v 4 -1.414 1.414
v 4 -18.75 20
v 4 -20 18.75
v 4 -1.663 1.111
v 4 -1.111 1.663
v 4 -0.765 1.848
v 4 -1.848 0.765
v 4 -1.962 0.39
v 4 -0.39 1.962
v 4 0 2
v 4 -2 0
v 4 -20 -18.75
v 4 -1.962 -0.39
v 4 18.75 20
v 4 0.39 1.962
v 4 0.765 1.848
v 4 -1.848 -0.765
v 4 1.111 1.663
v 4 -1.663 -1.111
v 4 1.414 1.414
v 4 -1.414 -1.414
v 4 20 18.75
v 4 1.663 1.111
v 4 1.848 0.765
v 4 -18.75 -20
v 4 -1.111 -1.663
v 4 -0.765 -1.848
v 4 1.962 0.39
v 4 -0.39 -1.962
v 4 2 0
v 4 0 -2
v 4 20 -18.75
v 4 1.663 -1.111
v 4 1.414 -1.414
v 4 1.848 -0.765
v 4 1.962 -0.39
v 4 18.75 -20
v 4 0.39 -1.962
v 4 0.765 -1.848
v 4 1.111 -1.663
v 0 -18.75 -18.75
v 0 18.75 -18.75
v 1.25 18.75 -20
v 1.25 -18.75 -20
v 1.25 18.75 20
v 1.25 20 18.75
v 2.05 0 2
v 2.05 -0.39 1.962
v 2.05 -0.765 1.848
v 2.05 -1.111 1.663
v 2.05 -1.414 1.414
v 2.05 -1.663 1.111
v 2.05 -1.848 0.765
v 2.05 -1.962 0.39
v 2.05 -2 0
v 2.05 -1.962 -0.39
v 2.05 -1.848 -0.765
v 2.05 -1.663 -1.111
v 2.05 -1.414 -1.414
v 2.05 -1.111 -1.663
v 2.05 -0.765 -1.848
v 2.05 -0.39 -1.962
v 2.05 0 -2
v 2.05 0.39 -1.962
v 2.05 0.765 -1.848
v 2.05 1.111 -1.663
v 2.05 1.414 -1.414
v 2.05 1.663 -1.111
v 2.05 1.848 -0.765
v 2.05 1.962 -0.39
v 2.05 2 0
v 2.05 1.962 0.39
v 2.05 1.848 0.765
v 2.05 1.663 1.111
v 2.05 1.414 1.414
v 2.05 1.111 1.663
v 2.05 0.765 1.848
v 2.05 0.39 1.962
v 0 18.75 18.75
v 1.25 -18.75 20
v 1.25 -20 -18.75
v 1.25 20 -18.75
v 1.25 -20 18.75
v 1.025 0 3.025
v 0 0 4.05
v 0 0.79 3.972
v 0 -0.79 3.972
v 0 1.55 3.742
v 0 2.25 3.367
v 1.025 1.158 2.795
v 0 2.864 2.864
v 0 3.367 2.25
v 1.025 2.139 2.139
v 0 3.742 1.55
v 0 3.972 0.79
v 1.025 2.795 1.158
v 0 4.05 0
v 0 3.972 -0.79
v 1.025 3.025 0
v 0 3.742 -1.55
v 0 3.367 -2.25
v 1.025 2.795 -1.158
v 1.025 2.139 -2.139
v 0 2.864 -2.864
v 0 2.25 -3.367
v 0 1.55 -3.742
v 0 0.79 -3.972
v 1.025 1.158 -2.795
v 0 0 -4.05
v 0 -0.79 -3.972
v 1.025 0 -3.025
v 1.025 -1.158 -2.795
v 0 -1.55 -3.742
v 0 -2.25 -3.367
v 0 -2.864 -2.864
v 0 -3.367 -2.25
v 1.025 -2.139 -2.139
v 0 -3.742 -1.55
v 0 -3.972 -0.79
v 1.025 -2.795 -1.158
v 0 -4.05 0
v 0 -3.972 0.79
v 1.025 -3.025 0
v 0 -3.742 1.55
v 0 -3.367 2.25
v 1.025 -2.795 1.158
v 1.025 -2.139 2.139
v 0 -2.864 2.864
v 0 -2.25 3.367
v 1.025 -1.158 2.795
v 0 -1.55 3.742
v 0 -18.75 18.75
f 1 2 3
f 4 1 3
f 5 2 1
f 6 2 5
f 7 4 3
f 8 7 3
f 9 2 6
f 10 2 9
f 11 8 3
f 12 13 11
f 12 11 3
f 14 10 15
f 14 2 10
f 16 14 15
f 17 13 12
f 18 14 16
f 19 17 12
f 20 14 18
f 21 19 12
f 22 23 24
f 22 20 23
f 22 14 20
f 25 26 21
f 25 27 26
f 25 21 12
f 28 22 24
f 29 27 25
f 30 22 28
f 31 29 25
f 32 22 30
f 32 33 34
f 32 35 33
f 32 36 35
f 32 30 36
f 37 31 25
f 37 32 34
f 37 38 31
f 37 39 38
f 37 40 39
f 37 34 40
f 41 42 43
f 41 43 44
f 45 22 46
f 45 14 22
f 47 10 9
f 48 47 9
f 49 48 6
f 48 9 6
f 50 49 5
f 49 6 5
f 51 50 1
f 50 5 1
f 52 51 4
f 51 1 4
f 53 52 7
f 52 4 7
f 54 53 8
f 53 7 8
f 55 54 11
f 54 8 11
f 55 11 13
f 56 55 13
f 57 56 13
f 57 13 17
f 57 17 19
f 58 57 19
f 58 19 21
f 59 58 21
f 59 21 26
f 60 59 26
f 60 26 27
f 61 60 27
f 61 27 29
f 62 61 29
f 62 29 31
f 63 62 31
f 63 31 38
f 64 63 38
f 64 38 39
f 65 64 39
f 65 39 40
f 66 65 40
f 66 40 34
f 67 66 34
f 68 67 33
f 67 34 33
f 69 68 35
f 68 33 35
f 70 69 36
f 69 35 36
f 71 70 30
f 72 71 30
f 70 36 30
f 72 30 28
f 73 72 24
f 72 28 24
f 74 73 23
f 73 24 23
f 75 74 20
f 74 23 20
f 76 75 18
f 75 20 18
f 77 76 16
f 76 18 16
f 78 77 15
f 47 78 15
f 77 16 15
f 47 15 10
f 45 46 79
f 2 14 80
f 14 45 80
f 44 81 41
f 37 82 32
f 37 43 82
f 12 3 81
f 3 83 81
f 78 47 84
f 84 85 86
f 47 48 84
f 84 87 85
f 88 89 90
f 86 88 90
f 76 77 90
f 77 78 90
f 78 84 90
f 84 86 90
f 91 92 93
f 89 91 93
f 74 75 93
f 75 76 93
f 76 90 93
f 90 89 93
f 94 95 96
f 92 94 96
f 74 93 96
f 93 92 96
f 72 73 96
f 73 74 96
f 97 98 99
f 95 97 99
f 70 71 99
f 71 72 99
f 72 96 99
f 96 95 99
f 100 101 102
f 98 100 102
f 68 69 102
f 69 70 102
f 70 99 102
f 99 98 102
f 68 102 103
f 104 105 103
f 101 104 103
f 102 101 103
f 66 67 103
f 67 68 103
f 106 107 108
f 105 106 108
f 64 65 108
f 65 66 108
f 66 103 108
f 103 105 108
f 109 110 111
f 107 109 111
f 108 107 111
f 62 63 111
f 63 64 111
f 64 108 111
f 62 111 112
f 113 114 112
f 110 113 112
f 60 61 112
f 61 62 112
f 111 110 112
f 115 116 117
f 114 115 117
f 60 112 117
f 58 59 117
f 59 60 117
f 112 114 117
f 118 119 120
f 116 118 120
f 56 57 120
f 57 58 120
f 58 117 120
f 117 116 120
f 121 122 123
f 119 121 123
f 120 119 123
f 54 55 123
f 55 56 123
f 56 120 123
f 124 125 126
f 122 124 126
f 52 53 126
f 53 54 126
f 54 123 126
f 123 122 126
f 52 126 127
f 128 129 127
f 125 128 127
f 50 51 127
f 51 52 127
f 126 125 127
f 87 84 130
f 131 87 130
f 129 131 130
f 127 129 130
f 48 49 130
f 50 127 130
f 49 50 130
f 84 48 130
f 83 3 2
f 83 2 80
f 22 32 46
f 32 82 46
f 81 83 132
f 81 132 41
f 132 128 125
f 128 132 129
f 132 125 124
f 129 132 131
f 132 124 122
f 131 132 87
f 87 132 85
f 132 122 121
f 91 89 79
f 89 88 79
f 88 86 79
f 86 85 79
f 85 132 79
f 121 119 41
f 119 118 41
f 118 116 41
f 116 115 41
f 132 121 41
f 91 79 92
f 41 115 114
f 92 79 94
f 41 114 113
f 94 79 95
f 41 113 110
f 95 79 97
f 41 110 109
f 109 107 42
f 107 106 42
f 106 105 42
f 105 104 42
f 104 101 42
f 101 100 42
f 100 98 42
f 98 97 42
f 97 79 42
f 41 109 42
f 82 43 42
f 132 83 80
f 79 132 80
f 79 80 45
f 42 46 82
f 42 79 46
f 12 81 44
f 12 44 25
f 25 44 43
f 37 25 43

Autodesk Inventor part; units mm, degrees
sketch "Skizze_1" plane through (0, 0, 0) normal (1, 0, 0) x (0, 0, -1)
  line L0 (-20, 20) -> (-20, -20)
  line L1 (-20, -20) -> (20, -20)
  line L2 (20, -20) -> (20, 20)
  line L3 (20, 20) -> (-20, 20)
extrude "Extrusion1" add sketch "Skizze_1" along normal blind 4
sketch "Sketch2" plane through (0, 0, 0) normal (-1, 0, 0) x (0, 0, 1)
  point P0 (0, 0)
hole "Hole1" at (0, 0, 0) direction (1, 0, 0) diameter 4 depth 4 countersink diameter 8.1 countersink angle 90
ref_plane "CS_ANBAU_CAP_XY" through (0, 0, 0) normal (0, 1, 0) x (1, 0, 0)
ref_plane "CS_ANBAU_CAP_YZ" through (0, 0, 0) normal (1, 0, 0) x (0, 0, -1)
ref_plane "CS_ANBAU_CAP_ZX" through (0, 0, 0) normal (0, 0, -1) x (0, 1, 0)
ref_plane "CS_ANBAU_CAP_90_XY" through (0, 0, 0) normal (0, 0, 1) x (1, 0, 0)
ref_plane "CS_ANBAU_CAP_90_YZ" through (0, 0, 0) normal (1, 0, 0) x (0, 1, 0)
ref_plane "CS_ANBAU_CAP_90_ZX" through (0, 0, 0) normal (0, 1, 0) x (0, 0, 1)
ref_plane "IB_1_XY" through (0, 0, 0) normal (1, 0, 0) x (0, 0, -1)
ref_plane "IB_1_YZ" through (0, 0, 0) normal (0, 0, -1) x (0, 1, 0)
ref_plane "IB_1_ZX" through (0, 0, 0) normal (0, 1, 0) x (1, 0, 0)
ref_plane "IB_10_XY" through (0, -14, 10) normal (1, 0, 0) x (0, 0, -1)
ref_plane "IB_10_YZ" through (0, -14, 10) normal (0, 0, -1) x (0, 1, 0)
ref_plane "IB_10_ZX" through (0, -14, 10) normal (0, 1, 0) x (1, 0, 0)
ref_plane "IB_11_XY" through (0, 14, 10) normal (1, 0, 0) x (0, 0, -1)
ref_plane "IB_11_YZ" through (0, 14, 10) normal (0, 0, -1) x (0, 1, 0)
ref_plane "IB_11_ZX" through (0, 14, 10) normal (0, 1, 0) x (1, 0, 0)
ref_plane "IB_12_XY" through (0, 0, 0) normal (1, 0, 0) x (0, 0, -1)
ref_plane "IB_12_YZ" through (0, 0, 0) normal (0, 0, -1) x (0, 1, 0)
ref_plane "IB_12_ZX" through (0, 0, 0) normal (0, 1, 0) x (1, 0, 0)
ref_plane "IB_2_XY" through (0, 0, -10) normal (1, 0, 0) x (0, 0, -1)
ref_plane "IB_2_YZ" through (0, 0, -10) normal (0, 0, -1) x (0, 1, 0)
ref_plane "IB_2_ZX" through (0, 0, -10) normal (0, 1, 0) x (1, 0, 0)
ref_plane "IB_3_XY" through (0, 0, 10) normal (1, 0, 0) x (0, 0, -1)
ref_plane "IB_3_YZ" through (0, 0, 10) normal (0, 0, -1) x (0, 1, 0)
ref_plane "IB_3_ZX" through (0, 0, 10) normal (0, 1, 0) x (1, 0, 0)
ref_plane "IB_4_XY" through (0, 13.5, -13.5) normal (1, 0, 0) x (0, 0, -1)
ref_plane "IB_4_YZ" through (0, 13.5, -13.5) normal (0, 0, -1) x (0, 1, 0)
ref_plane "IB_4_ZX" through (0, 13.5, -13.5) normal (0, 1, 0) x (1, 0, 0)
ref_plane "IB_5_XY" through (0, 13.5, 13.5) normal (1, 0, 0) x (0, 0, -1)
ref_plane "IB_5_YZ" through (0, 13.5, 13.5) normal (0, 0, -1) x (0, 1, 0)
ref_plane "IB_5_ZX" through (0, 13.5, 13.5) normal (0, 1, 0) x (1, 0, 0)
ref_plane "IB_6_XY" through (0, 1.5, 6.5) normal (1, 0, 0) x (0, 0, -1)
ref_plane "IB_6_YZ" through (0, 1.5, 6.5) normal (0, 0, -1) x (0, 1, 0)
ref_plane "IB_6_ZX" through (0, 1.5, 6.5) normal (0, 1, 0) x (1, 0, 0)
ref_plane "IB_7_XY" through (0, 1.5, -6.5) normal (1, 0, 0) x (0, 0, -1)
ref_plane "IB_7_YZ" through (0, 1.5, -6.5) normal (0, 0, -1) x (0, 1, 0)
ref_plane "IB_7_ZX" through (0, 1.5, -6.5) normal (0, 1, 0) x (1, 0, 0)
ref_plane "IB_8_XY" through (0, -2, 14) normal (1, 0, 0) x (0, 0, -1)
ref_plane "IB_8_YZ" through (0, -2, 14) normal (0, 0, -1) x (0, 1, 0)
ref_plane "IB_8_ZX" through (0, -2, 14) normal (0, 1, 0) x (1, 0, 0)
ref_plane "IB_9_XY" through (0, -2, -14) normal (1, 0, 0) x (0, 0, -1)
ref_plane "IB_9_YZ" through (0, -2, -14) normal (0, 0, -1) x (0, 1, 0)
ref_plane "IB_9_ZX" through (0, -2, -14) normal (0, 1, 0) x (1, 0, 0)
chamfer "Chamfer1" distance 1.25 angle 45 8 edges at (2, -20, -20) (0, -20, 0) (0, 0, -20) (2, 20, -20) (0, 20, 0) (2, 20, 20) (2, -20, 20) (0, 0, 20)
properties part number "Robotunits CAP_4040_1" material "ABS PlastiK"
